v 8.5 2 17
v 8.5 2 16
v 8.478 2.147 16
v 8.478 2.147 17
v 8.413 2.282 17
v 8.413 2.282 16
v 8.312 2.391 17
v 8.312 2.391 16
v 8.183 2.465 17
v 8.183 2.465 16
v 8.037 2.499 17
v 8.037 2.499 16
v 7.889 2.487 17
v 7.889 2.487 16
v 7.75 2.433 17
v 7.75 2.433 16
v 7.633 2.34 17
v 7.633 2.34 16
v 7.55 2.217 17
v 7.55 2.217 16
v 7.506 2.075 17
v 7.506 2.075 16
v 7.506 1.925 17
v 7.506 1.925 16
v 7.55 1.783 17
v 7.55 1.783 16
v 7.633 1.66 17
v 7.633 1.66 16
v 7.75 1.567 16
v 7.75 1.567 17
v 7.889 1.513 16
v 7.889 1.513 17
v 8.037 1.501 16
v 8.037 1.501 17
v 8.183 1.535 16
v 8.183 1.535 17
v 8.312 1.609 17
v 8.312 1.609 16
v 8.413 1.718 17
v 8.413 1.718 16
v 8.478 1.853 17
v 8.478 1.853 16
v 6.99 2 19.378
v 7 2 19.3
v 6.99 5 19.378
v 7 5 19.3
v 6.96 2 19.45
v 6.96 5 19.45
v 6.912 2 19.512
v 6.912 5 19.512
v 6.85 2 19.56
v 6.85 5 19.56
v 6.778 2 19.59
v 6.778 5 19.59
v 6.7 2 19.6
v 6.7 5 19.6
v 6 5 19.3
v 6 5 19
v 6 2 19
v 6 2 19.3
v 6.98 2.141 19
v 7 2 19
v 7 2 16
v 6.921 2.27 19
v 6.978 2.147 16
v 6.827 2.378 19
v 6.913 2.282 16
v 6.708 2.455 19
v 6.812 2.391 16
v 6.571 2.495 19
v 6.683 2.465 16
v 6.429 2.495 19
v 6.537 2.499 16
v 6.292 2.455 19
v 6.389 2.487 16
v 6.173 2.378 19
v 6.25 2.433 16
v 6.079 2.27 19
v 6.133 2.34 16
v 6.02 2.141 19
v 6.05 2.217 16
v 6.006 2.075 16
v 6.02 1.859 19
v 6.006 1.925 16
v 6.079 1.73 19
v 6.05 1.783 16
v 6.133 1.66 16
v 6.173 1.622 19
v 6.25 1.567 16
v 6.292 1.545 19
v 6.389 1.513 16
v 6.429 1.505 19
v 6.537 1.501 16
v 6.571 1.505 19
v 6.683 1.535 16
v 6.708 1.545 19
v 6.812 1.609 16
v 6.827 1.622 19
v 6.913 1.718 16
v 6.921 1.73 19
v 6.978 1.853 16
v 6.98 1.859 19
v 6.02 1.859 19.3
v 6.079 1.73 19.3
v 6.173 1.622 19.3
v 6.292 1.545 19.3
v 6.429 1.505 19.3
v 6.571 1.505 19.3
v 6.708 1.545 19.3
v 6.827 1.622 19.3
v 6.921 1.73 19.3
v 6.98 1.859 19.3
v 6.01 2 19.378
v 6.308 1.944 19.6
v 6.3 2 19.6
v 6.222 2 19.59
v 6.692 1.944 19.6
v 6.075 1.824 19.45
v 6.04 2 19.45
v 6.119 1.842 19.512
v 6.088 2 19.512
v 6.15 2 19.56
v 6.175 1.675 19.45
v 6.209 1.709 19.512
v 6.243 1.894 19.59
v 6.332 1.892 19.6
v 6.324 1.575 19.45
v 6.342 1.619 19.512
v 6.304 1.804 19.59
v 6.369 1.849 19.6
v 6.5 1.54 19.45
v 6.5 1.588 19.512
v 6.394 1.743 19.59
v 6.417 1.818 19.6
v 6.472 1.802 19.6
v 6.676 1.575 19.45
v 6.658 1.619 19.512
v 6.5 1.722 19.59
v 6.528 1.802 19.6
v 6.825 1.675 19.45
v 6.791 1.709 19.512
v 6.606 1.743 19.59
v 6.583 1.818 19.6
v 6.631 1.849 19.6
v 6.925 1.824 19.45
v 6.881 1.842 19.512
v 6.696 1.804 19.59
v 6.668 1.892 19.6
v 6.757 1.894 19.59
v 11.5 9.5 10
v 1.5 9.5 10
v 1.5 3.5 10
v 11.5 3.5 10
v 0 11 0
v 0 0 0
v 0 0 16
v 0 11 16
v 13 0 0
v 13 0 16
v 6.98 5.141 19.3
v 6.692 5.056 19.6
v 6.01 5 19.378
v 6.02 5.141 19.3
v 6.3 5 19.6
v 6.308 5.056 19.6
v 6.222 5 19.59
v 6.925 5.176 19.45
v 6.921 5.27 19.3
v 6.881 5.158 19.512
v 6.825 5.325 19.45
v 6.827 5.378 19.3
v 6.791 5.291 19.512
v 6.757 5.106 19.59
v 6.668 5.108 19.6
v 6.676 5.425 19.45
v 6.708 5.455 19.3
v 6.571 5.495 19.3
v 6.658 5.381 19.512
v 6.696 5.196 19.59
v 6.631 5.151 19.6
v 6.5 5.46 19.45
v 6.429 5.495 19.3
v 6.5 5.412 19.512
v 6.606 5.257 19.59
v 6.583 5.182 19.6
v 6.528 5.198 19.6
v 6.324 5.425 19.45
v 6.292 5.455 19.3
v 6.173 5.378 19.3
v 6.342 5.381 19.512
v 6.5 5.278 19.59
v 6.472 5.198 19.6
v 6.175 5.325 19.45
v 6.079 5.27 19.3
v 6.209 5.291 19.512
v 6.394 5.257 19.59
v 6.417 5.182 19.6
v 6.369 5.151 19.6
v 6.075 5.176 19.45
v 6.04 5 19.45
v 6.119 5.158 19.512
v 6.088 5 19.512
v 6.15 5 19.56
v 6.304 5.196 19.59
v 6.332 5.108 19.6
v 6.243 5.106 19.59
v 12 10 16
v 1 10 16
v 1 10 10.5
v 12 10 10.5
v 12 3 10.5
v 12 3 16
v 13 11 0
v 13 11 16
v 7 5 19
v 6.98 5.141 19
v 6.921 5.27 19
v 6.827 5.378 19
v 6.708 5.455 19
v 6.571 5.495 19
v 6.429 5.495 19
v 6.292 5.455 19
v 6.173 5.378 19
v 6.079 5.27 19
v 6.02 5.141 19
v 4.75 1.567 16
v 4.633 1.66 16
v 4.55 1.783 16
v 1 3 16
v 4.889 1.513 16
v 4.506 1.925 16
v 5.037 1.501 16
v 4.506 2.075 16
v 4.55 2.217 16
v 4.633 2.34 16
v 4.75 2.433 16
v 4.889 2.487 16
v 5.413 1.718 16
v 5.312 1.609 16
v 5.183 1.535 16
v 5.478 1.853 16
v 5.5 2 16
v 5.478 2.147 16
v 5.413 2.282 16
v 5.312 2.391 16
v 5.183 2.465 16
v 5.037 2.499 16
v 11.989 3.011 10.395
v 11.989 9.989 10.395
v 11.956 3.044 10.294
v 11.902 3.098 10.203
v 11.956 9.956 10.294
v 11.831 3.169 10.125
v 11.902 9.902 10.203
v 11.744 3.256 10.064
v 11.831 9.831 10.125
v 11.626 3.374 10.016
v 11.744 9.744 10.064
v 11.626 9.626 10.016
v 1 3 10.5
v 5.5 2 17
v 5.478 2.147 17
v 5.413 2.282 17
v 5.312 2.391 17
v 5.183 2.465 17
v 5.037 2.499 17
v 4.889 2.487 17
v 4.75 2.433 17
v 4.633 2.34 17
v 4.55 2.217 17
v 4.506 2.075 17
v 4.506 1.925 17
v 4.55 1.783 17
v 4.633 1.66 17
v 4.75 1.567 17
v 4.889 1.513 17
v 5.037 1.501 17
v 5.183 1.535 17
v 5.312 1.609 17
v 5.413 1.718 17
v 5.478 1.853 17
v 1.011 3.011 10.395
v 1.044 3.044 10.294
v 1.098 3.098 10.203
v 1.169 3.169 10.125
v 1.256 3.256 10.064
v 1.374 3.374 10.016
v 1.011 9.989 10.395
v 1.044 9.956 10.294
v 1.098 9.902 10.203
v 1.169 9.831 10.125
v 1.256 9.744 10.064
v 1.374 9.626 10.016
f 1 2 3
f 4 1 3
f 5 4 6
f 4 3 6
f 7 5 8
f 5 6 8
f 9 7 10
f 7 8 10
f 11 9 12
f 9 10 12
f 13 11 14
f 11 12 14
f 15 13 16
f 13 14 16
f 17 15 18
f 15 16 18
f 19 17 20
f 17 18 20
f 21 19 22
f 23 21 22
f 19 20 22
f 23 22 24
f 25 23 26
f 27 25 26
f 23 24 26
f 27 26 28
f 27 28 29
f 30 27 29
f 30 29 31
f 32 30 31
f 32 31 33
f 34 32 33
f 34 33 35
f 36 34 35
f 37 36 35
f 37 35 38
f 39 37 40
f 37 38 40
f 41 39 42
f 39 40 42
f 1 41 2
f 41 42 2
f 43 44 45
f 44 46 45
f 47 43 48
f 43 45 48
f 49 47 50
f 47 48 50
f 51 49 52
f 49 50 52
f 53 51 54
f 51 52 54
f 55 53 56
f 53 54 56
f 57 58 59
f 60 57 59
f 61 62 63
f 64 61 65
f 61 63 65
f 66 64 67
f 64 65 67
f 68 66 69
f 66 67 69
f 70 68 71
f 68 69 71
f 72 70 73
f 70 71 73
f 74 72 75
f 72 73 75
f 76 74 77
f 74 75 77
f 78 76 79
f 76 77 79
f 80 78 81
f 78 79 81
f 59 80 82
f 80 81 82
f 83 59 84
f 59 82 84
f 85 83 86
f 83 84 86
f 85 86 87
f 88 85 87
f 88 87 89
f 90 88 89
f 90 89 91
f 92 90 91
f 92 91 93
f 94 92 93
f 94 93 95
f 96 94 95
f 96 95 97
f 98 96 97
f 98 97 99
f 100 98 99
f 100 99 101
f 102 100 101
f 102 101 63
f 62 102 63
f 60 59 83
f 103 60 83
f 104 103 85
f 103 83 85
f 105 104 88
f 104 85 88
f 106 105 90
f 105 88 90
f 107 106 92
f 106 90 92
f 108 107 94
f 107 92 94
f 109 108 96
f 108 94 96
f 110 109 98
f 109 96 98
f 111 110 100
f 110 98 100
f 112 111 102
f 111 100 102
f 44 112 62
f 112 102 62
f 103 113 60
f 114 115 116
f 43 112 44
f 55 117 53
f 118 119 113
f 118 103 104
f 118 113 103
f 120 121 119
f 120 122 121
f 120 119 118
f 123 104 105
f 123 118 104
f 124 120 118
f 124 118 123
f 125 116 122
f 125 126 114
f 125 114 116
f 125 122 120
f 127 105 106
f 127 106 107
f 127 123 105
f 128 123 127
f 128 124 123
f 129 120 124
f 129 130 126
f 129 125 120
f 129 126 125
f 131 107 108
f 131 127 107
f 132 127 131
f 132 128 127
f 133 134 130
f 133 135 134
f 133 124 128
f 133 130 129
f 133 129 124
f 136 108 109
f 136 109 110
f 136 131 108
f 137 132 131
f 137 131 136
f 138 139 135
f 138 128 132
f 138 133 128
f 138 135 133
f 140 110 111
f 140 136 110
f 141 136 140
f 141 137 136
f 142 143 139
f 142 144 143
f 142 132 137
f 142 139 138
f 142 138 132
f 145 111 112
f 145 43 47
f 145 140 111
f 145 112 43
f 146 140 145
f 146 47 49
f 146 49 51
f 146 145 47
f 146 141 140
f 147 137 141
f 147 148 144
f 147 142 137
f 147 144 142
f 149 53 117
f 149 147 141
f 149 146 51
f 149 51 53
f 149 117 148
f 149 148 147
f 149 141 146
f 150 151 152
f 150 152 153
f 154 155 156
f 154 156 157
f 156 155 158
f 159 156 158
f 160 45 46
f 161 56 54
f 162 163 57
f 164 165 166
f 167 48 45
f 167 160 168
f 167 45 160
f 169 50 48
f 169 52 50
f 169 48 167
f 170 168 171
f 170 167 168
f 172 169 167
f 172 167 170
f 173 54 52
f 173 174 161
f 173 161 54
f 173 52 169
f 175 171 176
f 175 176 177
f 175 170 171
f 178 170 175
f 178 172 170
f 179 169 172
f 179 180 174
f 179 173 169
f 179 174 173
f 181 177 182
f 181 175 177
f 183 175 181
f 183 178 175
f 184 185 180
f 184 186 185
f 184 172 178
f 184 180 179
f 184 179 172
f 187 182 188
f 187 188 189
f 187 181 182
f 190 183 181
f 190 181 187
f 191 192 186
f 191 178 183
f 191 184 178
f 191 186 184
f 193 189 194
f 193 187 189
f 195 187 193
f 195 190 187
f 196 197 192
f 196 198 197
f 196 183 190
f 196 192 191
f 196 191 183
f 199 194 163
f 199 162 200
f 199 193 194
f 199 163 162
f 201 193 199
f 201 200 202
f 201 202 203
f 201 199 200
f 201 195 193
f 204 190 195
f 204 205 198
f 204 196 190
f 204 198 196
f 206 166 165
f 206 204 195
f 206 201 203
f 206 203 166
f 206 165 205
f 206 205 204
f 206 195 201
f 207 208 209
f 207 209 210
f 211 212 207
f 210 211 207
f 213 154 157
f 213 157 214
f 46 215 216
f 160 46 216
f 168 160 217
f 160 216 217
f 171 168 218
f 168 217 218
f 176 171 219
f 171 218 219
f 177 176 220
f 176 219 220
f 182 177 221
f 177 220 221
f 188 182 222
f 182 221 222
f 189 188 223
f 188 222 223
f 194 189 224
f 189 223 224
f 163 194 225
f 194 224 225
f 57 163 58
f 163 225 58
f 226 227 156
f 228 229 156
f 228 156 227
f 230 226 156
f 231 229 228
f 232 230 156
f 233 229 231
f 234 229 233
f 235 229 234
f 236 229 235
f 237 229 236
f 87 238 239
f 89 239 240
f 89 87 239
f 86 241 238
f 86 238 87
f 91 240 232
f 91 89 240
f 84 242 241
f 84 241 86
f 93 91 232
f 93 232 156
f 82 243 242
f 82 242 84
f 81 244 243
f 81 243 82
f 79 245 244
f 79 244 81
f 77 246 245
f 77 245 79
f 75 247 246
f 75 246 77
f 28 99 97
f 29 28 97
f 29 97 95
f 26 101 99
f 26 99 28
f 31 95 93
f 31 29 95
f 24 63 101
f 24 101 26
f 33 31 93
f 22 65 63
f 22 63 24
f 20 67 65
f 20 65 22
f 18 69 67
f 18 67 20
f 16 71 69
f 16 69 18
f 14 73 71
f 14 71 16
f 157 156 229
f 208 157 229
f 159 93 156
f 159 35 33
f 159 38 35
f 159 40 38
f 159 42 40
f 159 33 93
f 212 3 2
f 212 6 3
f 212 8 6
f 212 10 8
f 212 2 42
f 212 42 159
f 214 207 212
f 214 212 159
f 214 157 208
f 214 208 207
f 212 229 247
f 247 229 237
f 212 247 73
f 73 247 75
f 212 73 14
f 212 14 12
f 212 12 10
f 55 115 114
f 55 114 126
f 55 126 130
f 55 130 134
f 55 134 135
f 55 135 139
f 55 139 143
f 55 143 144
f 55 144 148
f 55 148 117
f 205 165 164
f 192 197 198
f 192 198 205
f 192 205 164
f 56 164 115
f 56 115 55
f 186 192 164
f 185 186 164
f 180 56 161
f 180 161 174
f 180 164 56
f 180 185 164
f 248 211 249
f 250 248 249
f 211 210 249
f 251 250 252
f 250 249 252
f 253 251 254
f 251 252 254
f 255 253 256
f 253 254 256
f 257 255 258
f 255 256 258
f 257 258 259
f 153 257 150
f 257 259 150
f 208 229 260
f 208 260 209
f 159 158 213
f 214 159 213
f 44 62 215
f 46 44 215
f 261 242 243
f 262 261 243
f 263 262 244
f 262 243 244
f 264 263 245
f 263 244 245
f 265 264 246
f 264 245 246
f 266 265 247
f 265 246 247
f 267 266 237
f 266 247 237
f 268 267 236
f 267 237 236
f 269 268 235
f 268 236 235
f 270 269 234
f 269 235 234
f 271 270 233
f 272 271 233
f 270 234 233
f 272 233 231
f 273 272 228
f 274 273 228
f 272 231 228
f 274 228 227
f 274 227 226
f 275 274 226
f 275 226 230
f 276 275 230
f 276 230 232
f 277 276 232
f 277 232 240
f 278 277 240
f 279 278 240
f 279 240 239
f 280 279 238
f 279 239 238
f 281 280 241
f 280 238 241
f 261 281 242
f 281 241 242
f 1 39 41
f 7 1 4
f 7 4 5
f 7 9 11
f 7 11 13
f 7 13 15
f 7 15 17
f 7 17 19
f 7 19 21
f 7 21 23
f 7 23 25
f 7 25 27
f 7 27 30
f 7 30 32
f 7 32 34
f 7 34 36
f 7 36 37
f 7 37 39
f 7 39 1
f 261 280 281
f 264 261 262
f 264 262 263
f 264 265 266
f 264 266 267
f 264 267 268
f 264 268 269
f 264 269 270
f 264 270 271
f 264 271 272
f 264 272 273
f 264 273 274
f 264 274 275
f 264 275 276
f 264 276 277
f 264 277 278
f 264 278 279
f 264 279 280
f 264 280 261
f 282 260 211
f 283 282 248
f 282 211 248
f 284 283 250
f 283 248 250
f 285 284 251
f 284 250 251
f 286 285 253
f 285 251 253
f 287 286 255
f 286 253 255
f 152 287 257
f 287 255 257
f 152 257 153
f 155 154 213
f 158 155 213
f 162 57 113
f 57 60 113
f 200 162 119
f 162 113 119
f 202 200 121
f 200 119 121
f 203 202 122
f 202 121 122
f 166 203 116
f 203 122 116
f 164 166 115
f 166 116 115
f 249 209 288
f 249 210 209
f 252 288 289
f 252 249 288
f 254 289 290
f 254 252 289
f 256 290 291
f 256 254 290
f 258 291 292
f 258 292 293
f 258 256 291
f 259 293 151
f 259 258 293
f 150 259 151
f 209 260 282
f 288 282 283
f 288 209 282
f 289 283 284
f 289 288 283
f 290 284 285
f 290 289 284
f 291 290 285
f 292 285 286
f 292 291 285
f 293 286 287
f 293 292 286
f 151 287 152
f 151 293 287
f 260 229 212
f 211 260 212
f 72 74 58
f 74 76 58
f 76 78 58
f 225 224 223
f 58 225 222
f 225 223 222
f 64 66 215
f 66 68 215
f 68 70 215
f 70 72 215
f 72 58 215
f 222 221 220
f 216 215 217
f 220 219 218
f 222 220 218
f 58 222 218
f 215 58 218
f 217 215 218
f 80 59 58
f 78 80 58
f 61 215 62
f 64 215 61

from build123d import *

# Parameters (mm, degrees)
F0_W     = 13
F0_H     = 11
F1_DEPTH = 16
F2_W     = 11
F2_H     = 7
F3_DEPTH = 6
F4_R     = 0.5
F5_R     = 0.5
F6_DEPTH = 1
F7_DEPTH = 3
F9_DEPTH = 0.6
F10_R    = 0.3


# Not quite as in the source:
# - a feature names something its author has since deleted; it is built from what else it names


with BuildPart() as f1:
    # F0 (on Top) → F1 (new body)
    with BuildSketch(Plane.XY):
        with Locations((6.5, 5.5)):
            Rectangle(F0_W, F0_H)
    extrude(amount=F1_DEPTH)

    # F2 (on face) → F3 (cut)
    with BuildSketch(Plane.XY.offset(16)):
        with Locations((6.5, 6.5)):
            Rectangle(F2_W, F2_H)
    extrude(amount=-F3_DEPTH, mode=Mode.SUBTRACT)

    # F4
    f4_edges = [f1.edges().sort_by_distance(p)[0] for p in [
        (1, 6.5, 10),
        (6.5, 3, 10),
        (12, 6.5, 10),
        (6.5, 10, 10),
    ]]
    fillet(f4_edges, radius=F4_R)

    # F5 (on face) → F6 (join)
    with BuildSketch(Plane.XY.offset(16)):
        with Locations((5, 2)):
            Circle(F5_R)
        with Locations((8, 2)):
            Circle(F5_R)
    extrude(amount=F6_DEPTH)

    # F5 (on face) → F7 (join)
    with BuildSketch(Plane.XY.offset(16)):
        with Locations((6.5, 2)):
            Circle(F5_R)
    extrude(amount=F7_DEPTH)

    # F8 (on face) → F9 (join)
    with BuildSketch(Plane.XY.offset(19)):
        with BuildLine():
            Line((6, 5), (6, 2))
            ThreePointArc((6, 2), (6.5, 1.5), (7, 2))
            Line((7, 2), (7, 5))
            ThreePointArc((7, 5), (6.5, 5.5), (6, 5))
        make_face()
    extrude(amount=F9_DEPTH)

    # F10
    f10_edges = [f1.edges().sort_by_distance(p)[0] for p in [
        (6, 3.5, 19.6),
        (6.5, 1.5, 19.6),
        (7, 3.5, 19.6),
        (6.5, 5.5, 19.6),
    ]]
    fillet(f10_edges, radius=F10_R)


solid = f1.part
